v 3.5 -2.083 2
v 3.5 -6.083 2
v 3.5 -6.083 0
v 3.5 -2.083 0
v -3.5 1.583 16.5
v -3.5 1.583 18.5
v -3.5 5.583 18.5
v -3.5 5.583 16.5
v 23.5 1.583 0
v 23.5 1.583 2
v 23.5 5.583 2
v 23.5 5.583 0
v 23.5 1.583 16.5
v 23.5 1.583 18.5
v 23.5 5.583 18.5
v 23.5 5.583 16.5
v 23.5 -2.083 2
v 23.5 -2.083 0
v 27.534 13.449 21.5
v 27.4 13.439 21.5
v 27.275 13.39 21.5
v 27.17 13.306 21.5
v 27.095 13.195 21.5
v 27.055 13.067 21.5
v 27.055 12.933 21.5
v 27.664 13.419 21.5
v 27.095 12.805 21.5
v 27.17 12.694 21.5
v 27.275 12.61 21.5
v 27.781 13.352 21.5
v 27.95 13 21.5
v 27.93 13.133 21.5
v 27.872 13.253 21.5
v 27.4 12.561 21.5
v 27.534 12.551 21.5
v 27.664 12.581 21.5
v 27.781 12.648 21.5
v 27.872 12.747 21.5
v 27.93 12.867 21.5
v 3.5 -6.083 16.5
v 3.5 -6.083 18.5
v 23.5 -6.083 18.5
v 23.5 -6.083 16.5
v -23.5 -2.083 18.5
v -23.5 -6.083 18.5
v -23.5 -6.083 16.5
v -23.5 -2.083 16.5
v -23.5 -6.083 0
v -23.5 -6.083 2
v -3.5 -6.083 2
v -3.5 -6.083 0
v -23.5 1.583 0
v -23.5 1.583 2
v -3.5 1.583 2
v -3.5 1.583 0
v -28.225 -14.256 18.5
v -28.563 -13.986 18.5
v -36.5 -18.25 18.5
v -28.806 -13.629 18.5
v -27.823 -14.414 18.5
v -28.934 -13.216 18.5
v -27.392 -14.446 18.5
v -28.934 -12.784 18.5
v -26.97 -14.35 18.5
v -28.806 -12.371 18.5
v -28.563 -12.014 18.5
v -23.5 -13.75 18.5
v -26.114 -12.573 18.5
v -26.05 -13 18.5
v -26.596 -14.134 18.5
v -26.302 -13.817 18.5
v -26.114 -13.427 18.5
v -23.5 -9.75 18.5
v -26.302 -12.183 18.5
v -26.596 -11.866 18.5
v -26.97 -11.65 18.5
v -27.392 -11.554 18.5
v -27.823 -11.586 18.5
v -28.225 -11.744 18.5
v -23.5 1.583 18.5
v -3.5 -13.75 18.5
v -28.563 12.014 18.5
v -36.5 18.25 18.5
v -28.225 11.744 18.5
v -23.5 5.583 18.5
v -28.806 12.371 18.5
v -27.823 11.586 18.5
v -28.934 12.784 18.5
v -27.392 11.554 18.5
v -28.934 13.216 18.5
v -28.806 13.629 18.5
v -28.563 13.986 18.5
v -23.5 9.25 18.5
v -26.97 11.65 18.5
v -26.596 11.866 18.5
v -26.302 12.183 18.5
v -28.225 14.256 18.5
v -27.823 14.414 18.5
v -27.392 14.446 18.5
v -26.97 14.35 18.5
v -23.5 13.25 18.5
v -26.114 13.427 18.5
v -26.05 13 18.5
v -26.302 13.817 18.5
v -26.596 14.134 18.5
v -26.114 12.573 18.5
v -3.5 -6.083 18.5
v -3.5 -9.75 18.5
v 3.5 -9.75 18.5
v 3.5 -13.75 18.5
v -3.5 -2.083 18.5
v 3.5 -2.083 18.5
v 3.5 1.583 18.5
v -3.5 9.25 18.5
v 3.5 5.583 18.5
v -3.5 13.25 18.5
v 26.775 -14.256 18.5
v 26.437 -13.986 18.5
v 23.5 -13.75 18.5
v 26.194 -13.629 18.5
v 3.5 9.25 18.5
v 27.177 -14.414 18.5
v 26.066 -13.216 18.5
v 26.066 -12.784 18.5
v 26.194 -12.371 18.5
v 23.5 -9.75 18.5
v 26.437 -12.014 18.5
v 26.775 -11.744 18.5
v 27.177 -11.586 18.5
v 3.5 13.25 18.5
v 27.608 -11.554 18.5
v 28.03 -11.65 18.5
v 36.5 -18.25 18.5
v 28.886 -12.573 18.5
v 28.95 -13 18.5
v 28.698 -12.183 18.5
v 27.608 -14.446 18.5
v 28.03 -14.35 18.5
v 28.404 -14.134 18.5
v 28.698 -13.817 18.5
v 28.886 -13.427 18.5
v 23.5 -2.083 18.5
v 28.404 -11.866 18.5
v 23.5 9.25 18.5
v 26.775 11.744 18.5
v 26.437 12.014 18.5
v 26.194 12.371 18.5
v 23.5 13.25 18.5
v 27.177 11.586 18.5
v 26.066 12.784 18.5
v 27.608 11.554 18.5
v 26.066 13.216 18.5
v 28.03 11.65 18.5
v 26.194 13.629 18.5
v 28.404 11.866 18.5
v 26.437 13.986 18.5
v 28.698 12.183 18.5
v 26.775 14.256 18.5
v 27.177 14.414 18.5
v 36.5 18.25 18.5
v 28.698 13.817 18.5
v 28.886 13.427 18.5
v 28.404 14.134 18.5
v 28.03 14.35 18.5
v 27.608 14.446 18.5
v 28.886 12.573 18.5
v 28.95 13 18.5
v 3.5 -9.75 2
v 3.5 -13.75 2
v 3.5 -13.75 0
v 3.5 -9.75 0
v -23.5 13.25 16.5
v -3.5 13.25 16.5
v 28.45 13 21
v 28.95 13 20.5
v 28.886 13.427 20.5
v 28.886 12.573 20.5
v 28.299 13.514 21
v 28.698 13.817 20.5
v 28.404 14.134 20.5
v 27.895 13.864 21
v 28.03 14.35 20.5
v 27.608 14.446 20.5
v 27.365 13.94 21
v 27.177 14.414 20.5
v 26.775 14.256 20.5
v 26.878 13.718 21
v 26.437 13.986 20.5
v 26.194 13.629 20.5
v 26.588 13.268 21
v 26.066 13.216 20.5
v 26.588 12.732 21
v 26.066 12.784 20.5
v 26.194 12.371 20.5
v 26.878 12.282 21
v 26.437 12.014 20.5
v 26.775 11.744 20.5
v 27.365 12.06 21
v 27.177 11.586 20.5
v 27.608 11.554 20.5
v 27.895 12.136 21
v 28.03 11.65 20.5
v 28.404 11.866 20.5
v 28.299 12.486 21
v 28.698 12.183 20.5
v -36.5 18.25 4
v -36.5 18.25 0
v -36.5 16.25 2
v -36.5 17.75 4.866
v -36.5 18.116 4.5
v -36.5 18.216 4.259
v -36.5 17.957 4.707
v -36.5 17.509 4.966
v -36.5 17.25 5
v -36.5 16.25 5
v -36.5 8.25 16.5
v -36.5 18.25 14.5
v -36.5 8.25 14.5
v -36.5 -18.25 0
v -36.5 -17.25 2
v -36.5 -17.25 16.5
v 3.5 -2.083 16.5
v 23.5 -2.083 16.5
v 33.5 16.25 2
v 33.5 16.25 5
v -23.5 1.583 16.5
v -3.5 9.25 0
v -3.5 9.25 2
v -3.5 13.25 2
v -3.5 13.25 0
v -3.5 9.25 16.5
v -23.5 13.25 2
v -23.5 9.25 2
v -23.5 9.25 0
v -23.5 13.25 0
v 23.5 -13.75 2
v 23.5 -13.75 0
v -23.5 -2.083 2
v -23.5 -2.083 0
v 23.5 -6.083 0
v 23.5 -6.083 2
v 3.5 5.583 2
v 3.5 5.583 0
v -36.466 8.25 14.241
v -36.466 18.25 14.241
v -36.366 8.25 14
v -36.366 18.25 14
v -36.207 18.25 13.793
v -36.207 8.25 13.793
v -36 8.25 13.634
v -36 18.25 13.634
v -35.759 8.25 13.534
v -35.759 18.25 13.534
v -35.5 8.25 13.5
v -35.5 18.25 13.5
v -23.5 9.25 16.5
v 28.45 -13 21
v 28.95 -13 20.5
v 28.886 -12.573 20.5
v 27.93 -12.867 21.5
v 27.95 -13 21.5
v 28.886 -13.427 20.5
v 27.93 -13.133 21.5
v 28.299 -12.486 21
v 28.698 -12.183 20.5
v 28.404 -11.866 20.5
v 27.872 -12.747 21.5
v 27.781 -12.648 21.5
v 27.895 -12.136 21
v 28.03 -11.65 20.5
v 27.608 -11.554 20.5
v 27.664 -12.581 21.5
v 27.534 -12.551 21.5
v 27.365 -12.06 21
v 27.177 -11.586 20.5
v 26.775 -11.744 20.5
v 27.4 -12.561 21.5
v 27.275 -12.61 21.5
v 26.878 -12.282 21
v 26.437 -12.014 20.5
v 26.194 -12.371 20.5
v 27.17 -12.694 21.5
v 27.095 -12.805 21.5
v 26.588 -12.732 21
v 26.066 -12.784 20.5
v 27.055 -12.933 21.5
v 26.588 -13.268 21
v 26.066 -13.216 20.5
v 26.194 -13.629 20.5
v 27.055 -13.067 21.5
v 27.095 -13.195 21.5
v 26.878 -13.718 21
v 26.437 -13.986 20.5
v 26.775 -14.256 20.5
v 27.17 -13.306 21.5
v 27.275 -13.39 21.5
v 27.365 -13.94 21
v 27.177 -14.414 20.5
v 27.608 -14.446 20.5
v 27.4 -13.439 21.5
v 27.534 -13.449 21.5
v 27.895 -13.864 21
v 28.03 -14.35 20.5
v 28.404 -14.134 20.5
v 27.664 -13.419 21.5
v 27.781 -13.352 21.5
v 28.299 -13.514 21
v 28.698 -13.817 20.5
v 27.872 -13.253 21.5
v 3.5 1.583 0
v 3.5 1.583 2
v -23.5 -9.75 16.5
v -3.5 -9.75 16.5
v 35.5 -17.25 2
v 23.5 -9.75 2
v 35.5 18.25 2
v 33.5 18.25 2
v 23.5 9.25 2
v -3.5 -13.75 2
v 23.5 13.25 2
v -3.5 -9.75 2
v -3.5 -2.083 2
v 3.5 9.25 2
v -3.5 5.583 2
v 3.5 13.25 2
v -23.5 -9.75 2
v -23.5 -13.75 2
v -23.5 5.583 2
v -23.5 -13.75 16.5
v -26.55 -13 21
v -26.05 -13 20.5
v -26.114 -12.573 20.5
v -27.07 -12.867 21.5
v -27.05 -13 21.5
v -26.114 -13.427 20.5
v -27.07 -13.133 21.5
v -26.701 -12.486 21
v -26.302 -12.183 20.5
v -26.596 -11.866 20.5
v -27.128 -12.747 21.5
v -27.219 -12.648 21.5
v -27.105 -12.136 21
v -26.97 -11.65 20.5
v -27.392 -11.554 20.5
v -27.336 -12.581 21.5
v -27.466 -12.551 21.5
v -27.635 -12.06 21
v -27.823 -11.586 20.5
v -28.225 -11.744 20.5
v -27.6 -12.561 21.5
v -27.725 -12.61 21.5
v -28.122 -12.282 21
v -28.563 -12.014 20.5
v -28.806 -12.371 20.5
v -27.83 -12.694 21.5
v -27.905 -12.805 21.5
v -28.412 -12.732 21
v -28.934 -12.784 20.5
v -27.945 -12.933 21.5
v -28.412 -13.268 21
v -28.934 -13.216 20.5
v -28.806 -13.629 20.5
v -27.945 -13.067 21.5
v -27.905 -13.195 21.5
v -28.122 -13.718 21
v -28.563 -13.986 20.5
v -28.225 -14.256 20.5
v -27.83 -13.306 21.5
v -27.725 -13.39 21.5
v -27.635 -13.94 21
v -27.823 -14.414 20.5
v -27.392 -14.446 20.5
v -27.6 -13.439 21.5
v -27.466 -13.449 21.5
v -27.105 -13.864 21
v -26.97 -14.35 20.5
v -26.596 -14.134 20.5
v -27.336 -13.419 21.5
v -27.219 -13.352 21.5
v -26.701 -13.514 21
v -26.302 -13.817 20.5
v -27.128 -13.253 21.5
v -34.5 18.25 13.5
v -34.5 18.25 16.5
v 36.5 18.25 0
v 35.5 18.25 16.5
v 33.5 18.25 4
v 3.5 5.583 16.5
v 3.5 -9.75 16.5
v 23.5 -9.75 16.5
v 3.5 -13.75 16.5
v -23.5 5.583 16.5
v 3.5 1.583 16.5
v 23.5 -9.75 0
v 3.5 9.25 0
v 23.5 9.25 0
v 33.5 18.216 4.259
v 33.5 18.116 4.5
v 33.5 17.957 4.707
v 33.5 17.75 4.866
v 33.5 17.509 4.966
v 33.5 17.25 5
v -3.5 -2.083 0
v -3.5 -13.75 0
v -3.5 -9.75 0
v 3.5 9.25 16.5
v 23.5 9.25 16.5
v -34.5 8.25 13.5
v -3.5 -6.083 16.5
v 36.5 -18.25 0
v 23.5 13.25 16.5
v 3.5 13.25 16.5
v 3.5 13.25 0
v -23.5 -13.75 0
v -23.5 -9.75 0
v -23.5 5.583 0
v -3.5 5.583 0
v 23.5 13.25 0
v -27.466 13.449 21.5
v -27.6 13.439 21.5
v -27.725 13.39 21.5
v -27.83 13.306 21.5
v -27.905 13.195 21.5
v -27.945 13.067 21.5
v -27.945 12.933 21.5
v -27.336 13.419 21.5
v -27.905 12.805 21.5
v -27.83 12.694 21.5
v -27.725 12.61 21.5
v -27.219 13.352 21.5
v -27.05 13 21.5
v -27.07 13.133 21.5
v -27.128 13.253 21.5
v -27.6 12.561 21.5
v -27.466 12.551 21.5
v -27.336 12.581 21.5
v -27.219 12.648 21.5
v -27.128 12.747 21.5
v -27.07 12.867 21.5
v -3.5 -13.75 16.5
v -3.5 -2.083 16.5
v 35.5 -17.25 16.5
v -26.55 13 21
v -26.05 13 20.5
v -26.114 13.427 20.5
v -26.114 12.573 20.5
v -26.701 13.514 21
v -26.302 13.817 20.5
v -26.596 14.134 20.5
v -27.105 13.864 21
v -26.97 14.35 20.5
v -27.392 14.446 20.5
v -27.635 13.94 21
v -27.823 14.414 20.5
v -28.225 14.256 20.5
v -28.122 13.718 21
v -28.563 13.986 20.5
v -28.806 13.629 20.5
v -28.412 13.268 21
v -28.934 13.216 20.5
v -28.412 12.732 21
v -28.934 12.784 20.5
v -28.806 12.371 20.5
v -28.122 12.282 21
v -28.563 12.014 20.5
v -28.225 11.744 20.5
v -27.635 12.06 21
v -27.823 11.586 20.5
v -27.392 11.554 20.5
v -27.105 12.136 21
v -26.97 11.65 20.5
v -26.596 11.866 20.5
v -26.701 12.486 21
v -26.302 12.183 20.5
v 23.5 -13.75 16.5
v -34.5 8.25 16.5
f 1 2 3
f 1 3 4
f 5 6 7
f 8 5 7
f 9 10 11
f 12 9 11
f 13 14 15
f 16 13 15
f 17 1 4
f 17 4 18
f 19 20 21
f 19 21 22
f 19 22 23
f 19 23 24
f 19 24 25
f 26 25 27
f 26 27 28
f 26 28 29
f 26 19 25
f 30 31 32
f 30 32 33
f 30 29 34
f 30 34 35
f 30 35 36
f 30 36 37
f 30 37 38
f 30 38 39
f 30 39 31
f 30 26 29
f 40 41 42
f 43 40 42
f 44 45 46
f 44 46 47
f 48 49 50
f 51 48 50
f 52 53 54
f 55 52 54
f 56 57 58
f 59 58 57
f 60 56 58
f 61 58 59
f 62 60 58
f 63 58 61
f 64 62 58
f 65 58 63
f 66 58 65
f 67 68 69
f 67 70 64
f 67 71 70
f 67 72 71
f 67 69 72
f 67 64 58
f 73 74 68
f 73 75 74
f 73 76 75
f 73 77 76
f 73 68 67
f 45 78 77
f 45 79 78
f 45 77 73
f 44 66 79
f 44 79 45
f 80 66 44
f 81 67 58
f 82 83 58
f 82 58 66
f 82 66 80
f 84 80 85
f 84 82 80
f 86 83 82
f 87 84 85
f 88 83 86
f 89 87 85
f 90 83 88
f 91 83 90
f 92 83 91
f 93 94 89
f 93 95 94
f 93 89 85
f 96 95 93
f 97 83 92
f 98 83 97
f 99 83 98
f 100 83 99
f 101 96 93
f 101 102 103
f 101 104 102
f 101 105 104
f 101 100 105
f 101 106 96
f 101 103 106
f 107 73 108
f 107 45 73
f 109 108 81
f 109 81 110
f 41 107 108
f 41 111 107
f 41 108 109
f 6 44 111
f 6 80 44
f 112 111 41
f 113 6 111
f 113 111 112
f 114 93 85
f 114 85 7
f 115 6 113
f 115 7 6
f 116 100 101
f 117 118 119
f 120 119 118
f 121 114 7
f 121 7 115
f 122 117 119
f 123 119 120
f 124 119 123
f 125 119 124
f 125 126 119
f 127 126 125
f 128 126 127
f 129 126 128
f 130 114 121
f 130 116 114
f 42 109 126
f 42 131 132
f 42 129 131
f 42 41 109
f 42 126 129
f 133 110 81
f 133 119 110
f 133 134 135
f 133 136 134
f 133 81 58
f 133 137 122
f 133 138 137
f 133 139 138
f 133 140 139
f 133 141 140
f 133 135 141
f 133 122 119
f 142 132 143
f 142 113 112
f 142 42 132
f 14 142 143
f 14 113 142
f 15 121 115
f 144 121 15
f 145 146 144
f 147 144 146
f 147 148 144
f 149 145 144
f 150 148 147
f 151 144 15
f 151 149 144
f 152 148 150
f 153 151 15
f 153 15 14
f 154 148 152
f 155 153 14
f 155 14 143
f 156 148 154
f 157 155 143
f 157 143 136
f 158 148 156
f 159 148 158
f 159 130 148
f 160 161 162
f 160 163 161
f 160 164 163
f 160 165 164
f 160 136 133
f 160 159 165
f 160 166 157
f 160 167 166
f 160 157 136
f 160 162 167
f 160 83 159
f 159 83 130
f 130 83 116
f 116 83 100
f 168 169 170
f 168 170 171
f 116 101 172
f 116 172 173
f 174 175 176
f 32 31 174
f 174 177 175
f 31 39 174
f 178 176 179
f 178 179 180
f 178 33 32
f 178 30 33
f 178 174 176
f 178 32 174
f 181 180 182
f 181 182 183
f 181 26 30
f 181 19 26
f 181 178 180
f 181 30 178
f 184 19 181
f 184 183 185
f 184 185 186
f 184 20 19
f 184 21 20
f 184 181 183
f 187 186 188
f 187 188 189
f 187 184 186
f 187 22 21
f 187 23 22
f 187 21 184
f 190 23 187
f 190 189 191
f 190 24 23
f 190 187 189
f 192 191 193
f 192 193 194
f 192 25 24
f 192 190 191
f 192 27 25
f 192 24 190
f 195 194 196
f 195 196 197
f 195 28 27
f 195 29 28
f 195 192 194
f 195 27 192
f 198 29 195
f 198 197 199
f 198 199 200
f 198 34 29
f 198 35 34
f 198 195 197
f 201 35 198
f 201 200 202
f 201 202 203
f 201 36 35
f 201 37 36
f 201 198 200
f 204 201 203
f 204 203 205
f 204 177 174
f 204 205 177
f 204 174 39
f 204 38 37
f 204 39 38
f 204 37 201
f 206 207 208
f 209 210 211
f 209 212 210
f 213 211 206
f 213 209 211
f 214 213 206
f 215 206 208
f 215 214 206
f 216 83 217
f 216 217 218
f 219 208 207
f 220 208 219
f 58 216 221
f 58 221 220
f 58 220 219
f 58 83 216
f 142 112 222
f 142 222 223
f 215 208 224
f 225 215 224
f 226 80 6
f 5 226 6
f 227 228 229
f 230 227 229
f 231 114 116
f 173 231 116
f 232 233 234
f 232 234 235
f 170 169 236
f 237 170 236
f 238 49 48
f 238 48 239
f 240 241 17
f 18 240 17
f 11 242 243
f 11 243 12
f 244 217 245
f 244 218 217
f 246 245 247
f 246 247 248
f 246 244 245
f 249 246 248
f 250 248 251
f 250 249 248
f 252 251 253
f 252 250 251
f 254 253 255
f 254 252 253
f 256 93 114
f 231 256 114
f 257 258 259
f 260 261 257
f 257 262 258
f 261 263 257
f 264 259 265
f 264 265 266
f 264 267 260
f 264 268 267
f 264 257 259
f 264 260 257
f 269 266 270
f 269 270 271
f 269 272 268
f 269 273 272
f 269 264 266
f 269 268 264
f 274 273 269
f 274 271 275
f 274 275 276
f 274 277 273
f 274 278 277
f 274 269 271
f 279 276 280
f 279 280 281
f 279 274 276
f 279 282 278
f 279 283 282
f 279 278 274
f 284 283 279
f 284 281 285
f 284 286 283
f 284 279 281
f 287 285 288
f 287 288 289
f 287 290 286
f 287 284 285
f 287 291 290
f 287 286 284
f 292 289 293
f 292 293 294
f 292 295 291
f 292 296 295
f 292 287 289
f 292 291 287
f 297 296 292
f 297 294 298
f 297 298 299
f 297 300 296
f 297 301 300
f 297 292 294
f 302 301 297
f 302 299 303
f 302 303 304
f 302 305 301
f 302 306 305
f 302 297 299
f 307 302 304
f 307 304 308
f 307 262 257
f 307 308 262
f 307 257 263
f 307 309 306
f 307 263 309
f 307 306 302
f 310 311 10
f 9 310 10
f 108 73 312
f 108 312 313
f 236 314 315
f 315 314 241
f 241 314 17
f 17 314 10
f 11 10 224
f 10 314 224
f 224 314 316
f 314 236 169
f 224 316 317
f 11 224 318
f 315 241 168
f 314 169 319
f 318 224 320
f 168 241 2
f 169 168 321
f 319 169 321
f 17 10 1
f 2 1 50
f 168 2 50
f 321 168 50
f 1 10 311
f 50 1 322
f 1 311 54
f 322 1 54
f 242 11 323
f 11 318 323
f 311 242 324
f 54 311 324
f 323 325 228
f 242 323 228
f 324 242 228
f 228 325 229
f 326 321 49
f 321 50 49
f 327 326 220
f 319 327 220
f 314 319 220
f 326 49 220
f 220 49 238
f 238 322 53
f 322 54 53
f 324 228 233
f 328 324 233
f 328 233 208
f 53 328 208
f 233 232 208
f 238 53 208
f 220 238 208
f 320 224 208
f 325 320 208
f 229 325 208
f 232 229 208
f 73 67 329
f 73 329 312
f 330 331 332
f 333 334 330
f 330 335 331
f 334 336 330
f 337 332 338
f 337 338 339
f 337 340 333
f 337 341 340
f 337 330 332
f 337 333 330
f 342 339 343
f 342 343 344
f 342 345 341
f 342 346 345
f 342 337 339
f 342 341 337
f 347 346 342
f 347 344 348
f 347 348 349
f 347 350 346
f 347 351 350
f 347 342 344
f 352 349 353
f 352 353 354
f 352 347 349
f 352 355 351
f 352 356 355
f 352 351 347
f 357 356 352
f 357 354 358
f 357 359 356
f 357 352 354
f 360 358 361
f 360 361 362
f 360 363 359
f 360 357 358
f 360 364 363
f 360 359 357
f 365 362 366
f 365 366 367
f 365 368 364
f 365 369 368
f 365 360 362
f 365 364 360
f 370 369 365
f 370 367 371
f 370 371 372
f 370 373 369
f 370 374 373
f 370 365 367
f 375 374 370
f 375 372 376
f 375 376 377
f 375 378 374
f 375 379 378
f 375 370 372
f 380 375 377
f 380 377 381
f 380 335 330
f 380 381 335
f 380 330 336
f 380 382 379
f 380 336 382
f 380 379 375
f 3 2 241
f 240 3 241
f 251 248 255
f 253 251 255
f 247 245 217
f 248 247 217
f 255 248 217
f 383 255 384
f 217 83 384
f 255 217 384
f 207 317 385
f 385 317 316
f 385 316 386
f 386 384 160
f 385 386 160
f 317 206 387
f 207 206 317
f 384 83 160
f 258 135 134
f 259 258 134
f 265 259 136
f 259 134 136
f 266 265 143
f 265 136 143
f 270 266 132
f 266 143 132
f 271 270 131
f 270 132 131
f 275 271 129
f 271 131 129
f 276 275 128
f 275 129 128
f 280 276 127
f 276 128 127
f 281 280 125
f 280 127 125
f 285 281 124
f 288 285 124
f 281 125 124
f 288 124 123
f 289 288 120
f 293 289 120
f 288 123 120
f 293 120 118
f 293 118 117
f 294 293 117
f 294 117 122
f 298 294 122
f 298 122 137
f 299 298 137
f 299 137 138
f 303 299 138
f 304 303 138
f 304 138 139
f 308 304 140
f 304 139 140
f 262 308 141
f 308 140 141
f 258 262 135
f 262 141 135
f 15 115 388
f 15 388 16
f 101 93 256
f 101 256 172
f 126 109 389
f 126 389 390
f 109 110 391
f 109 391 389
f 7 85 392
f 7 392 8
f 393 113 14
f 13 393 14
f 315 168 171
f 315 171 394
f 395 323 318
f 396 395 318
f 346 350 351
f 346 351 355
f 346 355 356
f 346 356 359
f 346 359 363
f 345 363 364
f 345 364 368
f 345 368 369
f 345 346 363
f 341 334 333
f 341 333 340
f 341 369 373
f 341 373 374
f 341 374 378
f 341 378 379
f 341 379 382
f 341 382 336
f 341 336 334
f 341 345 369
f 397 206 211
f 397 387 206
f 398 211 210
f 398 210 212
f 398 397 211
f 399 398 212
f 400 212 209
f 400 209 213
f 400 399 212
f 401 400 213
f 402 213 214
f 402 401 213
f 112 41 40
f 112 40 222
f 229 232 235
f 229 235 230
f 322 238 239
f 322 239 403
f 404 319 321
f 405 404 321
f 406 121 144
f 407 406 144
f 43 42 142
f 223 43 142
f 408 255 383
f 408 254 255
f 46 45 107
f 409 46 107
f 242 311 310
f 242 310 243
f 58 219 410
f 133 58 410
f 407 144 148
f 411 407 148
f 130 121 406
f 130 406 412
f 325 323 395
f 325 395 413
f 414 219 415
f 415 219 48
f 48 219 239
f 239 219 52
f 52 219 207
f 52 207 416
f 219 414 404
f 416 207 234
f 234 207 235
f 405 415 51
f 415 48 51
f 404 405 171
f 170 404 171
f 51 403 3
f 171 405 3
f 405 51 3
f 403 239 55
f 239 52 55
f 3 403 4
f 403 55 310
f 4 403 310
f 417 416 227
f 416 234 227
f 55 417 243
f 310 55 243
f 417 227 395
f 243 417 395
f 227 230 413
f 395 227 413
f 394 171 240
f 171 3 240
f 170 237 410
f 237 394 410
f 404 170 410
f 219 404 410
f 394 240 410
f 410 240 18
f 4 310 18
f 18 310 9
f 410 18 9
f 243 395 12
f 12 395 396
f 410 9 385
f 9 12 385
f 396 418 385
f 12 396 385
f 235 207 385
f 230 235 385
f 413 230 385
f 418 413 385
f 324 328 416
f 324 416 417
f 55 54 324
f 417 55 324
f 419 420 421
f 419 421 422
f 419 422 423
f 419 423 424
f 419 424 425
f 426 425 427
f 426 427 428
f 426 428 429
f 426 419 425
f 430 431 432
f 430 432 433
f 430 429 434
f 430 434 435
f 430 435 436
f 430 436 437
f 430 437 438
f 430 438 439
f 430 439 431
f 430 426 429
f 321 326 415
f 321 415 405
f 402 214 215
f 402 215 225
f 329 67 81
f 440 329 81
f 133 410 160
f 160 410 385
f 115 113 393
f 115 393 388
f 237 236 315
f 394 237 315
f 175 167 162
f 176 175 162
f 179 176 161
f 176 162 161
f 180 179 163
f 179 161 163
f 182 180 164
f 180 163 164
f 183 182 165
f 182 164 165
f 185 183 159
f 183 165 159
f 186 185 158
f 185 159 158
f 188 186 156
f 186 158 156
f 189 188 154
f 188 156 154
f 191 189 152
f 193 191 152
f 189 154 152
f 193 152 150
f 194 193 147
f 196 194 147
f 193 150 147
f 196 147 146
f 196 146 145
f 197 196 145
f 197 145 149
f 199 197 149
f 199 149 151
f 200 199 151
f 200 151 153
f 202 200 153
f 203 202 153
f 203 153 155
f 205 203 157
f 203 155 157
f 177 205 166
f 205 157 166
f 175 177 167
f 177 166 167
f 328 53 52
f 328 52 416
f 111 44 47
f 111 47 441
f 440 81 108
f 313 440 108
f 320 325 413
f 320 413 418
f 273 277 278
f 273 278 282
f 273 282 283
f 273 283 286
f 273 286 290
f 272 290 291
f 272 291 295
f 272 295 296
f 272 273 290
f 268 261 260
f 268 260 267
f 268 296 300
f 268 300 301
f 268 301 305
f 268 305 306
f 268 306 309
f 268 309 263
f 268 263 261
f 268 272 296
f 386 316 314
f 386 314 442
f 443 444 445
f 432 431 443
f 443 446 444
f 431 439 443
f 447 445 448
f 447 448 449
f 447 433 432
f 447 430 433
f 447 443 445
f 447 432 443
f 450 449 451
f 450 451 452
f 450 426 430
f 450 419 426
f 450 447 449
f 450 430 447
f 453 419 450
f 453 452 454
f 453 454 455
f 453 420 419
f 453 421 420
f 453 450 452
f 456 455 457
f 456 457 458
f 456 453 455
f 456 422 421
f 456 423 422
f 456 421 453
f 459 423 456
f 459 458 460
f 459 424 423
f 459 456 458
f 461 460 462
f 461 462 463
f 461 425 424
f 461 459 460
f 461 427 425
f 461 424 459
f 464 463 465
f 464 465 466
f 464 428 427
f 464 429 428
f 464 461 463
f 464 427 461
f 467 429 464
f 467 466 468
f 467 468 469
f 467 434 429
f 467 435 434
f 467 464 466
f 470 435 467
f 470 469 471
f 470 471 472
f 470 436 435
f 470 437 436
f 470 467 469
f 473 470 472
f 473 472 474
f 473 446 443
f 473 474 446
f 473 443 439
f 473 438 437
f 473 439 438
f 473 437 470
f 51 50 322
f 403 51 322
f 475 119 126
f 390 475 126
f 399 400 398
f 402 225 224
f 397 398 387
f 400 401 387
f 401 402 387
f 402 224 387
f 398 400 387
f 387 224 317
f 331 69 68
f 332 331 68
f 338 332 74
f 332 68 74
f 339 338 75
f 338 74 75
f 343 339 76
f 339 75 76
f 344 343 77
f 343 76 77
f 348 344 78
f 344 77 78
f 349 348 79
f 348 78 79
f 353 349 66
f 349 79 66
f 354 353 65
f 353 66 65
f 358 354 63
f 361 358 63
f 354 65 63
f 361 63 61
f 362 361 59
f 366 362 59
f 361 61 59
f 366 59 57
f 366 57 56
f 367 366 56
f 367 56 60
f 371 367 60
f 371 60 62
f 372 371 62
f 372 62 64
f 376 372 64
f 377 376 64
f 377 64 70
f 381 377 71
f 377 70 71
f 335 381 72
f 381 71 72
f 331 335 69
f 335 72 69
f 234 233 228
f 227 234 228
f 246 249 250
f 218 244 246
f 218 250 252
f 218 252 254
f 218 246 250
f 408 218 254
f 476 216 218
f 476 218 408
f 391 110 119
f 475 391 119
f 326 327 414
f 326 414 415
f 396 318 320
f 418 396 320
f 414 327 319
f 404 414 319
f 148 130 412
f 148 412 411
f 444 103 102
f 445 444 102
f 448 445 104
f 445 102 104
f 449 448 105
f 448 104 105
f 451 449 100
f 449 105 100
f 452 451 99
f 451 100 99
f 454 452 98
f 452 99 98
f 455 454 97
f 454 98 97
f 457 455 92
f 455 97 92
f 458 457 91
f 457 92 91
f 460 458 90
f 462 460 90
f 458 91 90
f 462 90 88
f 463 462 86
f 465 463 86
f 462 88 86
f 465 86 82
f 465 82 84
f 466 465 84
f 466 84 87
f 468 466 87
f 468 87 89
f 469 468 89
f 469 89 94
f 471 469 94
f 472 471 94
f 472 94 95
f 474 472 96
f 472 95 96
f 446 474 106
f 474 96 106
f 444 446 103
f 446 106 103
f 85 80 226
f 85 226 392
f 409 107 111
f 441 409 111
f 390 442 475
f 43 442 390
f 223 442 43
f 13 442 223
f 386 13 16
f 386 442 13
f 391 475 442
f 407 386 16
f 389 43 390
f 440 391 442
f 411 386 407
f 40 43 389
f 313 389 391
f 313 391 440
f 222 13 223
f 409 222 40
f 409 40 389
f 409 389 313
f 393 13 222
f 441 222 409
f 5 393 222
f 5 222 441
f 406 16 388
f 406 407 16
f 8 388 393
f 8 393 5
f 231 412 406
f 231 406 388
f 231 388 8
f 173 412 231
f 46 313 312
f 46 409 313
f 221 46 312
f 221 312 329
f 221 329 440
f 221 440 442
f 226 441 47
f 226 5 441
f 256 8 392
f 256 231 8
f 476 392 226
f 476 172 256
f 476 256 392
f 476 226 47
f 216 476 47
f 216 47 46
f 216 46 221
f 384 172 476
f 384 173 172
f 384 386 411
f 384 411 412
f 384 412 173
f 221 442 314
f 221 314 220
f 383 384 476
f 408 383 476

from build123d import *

# Parameters (mm, degrees)
SKETCH_W            = 73
SKETCH_H            = 36.5
PAD_DEPTH           = 18.5
SKETCH001_W         = 72
SKETCH001_H         = 14.5
POCKET_DEPTH        = 35.5
SKETCH002_W         = 70
SKETCH002_H         = 2
PAD001_DEPTH        = 3
FILLET_R            = 1
SKETCH003_W         = 2
SKETCH003_H         = 10
PAD002_DEPTH        = 3
FILLET001_R         = 1
SKETCH005_R         = 1.45
PAD003_DEPTH        = 3
CHAMFER_SIZE        = 1
SKETCH006_W         = 20
SKETCH006_H         = 4
POCKET001_DEPTH     = 18.501
LINEARPATTERN_COUNT = 4
LINEARPATTERN_PITCH = 7.666667


with BuildPart() as part:
    # Sketch → Pad (new body)
    with BuildSketch(Plane.XY):
        Rectangle(SKETCH_W, SKETCH_H)
    extrude(amount=PAD_DEPTH)

    # Sketch001 (on Face3 of Pad) → Pocket (cut)
    with BuildSketch(Plane(origin=(0, 18.25, 0), x_dir=(-1, 0, 0), z_dir=(0, 1, 0))):
        with Locations((0.5, 9.25)):
            Rectangle(SKETCH001_W, SKETCH001_H)
    extrude(amount=-POCKET_DEPTH, mode=Mode.SUBTRACT)

    # Sketch002 (on Face9 of Pocket) → Pad001 (join)
    with BuildSketch(Plane.XY.offset(2)):
        with Locations((-1.5, 17.25)):
            Rectangle(SKETCH002_W, SKETCH002_H)
    extrude(amount=PAD001_DEPTH)

    # Fillet
    fillet_edges = [part.edges().sort_by_distance(p)[0] for p in [
        (-1.5, 18.25, 5),
    ]]
    fillet(fillet_edges, radius=FILLET_R)

    # Sketch003 (on Face10 of Fillet) → Pad002 (join)
    with BuildSketch(Plane(origin=(0, 0, 16.5), x_dir=(1, 0, 0), z_dir=(0, 0, -1))):
        with Locations((-35.5, -13.25)):
            Rectangle(SKETCH003_W, SKETCH003_H)
    extrude(amount=PAD002_DEPTH)

    # Fillet001
    fillet001_edges = [part.edges().sort_by_distance(p)[0] for p in [
        (-36.5, 13.25, 13.5),
    ]]
    fillet(fillet001_edges, radius=FILLET001_R)

    # Sketch005 (on Face8 of Fillet001) → Pad003 (join)
    with BuildSketch(Plane.XY.offset(18.5)):
        with Locations((-27.5, 13)):
            Circle(SKETCH005_R)
        with Locations((-27.5, -13)):
            Circle(SKETCH005_R)
        with Locations((27.5, 13)):
            Circle(SKETCH005_R)
        with Locations((27.5, -13)):
            Circle(SKETCH005_R)
    extrude(amount=PAD003_DEPTH)

    # Chamfer
    chamfer_edges = [part.edges().sort_by_distance(p)[0] for p in [
        (26.05, 13, 21.5),
        (-28.95, 13, 21.5),
        (-28.95, -13, 21.5),
        (26.05, -13, 21.5),
    ]]
    chamfer(chamfer_edges, length=CHAMFER_SIZE)

    # Sketch006 (on Face3 of Chamfer) → Pocket001 (cut, through all)
    with BuildSketch(Plane.XY.offset(18.5)):
        with Locations((-13.5, -11.75)):
            Rectangle(SKETCH006_W, SKETCH006_H)
        with Locations((13.5, -11.75)):
            Rectangle(SKETCH006_W, SKETCH006_H)
    pocket001 = extrude(amount=-POCKET001_DEPTH, mode=Mode.SUBTRACT)

    # LinearPattern: Pocket001 ×4
    with Locations(*[(0, i * LINEARPATTERN_PITCH, 0) for i in range(1, LINEARPATTERN_COUNT)]):
        add(pocket001, mode=Mode.SUBTRACT)


solid = part.part
